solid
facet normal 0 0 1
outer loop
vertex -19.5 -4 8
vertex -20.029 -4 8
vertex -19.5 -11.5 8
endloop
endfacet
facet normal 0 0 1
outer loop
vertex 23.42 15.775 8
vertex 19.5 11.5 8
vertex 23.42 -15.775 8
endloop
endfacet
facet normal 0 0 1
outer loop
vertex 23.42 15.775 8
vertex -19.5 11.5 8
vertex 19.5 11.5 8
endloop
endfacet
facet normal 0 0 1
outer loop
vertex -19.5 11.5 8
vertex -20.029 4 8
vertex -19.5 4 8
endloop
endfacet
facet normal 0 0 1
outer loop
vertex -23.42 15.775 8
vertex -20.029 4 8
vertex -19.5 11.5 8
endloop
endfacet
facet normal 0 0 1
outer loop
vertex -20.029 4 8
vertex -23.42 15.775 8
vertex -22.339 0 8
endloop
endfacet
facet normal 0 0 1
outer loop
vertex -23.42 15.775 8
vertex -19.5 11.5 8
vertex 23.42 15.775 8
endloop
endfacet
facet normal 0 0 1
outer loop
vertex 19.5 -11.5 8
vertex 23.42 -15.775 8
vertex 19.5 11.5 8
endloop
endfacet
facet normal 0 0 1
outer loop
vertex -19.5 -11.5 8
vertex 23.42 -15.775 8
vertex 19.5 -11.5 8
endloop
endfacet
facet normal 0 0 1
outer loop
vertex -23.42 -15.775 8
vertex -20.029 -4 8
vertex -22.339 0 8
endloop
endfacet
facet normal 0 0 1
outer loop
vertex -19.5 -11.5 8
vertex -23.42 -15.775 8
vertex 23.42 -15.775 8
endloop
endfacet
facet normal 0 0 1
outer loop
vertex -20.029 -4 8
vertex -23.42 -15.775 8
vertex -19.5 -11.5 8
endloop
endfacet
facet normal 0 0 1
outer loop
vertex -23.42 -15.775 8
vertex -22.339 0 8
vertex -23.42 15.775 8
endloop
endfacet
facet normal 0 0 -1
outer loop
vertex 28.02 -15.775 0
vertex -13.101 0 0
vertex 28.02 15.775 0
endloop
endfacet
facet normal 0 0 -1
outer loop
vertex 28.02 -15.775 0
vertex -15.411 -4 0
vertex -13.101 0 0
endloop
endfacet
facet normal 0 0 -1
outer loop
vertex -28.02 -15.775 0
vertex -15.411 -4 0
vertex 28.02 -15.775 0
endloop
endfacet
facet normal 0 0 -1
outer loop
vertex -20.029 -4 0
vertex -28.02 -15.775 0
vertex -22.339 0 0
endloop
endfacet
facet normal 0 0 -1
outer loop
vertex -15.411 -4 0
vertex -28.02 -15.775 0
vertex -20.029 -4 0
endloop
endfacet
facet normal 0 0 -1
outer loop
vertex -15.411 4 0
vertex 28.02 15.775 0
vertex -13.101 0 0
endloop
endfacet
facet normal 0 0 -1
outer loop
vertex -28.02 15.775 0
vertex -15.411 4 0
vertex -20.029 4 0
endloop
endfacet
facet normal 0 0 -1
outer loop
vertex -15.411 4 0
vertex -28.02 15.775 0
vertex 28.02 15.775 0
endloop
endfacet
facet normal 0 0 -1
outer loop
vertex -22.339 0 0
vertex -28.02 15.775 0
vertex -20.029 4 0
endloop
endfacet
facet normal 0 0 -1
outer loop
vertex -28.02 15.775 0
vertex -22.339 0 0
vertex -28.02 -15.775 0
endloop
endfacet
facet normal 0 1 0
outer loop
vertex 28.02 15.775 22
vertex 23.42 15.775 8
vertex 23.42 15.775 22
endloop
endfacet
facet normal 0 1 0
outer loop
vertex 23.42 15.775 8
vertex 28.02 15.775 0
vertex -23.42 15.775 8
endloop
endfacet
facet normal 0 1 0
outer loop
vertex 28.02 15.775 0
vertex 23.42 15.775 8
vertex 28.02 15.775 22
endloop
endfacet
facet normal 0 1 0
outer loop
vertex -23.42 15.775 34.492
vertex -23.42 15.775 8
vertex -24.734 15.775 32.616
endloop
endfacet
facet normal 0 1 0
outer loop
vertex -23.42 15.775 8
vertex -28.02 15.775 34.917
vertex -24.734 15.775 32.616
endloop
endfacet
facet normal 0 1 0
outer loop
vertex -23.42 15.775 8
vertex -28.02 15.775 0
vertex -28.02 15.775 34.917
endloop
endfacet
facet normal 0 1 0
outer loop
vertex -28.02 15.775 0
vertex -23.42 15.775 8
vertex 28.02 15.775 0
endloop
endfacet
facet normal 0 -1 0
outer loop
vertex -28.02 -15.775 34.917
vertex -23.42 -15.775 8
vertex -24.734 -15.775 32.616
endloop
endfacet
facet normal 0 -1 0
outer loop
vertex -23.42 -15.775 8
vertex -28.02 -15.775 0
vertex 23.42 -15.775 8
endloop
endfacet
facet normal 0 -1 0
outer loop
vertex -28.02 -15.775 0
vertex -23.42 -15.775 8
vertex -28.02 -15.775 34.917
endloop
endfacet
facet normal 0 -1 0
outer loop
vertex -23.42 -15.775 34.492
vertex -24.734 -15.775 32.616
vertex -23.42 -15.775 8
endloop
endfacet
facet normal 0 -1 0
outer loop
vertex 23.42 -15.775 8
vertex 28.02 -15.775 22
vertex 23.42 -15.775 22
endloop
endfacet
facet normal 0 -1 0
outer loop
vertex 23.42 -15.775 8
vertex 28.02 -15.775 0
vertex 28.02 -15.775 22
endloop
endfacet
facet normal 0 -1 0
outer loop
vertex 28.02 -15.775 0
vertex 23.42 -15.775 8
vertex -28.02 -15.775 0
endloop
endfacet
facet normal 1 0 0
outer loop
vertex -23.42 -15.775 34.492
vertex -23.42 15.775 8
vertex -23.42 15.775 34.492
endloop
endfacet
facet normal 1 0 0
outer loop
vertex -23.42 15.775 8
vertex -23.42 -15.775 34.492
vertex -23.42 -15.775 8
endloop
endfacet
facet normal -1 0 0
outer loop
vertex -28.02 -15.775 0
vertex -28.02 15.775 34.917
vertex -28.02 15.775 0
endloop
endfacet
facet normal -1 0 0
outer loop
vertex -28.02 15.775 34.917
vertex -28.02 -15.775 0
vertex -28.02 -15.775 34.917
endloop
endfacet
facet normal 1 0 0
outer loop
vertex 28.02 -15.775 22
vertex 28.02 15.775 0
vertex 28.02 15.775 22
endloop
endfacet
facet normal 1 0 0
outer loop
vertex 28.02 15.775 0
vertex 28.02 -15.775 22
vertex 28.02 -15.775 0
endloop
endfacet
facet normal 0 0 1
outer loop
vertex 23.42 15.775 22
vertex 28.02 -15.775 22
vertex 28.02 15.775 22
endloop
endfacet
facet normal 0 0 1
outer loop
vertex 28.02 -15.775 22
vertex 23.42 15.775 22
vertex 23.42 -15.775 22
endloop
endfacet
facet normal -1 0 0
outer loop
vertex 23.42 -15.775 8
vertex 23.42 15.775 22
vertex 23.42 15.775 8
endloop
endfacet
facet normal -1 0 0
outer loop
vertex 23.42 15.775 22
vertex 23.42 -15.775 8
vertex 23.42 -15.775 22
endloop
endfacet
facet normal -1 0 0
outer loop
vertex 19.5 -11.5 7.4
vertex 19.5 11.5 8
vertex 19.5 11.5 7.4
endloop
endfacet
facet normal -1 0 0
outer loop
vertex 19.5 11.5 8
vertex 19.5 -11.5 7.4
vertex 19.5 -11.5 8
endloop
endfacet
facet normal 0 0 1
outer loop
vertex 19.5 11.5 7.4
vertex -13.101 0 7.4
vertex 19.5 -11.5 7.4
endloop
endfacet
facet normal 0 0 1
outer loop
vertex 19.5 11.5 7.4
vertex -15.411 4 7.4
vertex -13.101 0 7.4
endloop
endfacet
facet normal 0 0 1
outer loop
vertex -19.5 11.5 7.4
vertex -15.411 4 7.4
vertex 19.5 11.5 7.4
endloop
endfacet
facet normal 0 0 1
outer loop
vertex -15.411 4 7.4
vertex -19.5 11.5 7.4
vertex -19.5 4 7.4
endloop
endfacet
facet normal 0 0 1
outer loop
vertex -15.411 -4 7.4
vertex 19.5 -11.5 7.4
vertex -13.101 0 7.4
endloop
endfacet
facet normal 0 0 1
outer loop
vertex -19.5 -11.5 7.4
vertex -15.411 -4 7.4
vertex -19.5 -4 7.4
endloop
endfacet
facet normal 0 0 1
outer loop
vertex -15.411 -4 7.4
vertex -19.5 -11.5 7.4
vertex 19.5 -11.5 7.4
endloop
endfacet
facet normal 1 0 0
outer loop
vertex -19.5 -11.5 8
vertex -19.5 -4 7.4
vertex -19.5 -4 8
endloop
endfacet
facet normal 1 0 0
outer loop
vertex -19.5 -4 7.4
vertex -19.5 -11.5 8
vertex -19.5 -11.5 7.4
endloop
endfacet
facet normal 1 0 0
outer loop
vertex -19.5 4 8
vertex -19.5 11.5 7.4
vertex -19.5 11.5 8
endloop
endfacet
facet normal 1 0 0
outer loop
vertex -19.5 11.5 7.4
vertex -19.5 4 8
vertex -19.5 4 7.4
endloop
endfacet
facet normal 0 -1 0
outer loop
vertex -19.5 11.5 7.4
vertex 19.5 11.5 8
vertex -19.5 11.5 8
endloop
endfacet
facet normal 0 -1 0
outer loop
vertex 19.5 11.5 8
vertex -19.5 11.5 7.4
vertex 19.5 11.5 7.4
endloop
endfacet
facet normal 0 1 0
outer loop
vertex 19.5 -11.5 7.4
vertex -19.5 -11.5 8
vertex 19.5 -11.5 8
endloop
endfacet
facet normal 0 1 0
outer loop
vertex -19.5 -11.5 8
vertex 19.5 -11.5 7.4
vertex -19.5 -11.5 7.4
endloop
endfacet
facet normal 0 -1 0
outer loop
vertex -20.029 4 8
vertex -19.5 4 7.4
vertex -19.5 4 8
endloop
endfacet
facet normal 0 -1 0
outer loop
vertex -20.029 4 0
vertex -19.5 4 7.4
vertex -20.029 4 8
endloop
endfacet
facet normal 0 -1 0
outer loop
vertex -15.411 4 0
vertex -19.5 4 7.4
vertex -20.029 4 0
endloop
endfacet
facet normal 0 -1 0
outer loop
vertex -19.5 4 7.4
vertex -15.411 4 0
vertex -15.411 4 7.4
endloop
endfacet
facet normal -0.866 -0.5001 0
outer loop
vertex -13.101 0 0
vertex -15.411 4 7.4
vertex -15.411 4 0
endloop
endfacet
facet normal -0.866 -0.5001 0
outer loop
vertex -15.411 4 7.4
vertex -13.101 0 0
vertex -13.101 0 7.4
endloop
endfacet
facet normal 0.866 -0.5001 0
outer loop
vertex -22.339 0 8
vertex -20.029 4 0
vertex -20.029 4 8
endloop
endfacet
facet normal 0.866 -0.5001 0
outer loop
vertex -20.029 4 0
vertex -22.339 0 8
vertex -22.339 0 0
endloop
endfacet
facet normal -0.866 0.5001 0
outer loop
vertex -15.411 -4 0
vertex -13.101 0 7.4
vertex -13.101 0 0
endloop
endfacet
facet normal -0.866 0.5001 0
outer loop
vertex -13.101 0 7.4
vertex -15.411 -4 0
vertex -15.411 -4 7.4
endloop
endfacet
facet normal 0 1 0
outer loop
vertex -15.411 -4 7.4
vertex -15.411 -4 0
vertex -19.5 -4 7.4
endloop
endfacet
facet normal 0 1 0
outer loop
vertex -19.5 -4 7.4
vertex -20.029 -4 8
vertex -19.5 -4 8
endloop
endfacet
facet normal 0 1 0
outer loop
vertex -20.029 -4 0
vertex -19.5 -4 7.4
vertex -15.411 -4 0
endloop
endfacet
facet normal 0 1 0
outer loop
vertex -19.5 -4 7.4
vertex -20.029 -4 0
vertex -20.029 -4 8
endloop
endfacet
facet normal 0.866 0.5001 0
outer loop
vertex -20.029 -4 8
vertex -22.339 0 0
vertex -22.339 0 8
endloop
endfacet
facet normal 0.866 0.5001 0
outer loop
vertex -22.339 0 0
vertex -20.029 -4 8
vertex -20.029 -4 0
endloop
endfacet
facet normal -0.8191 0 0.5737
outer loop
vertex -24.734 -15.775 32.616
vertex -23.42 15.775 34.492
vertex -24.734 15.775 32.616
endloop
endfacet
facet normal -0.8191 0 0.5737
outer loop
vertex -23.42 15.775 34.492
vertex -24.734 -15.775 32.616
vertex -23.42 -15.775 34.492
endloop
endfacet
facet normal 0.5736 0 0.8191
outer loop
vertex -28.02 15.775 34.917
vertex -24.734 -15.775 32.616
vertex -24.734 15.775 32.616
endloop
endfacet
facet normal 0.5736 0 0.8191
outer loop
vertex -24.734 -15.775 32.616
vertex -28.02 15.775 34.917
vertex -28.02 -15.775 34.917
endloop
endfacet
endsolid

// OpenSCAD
// Rigid C-shaped / U-bracket with open rectangular throat and a CLEAR hex through-hole
// Bounding box target: 55.4 x 31.5 x 37.5 mm (L x W x H)

$fn = 96;

// -------------------- Parameters (mm) --------------------
bbox_L = 55.44;
bbox_W = 31.55;
bbox_H = 37.52;

wall_t        = 4.0;   // leg thickness along X
bar_thickness = 8.0;   // base bar thickness along Z

// Leg heights (asymmetric)
long_leg_H  = bbox_H;  // tall leg reaches full height
short_leg_H = 22.0;    // shorter leg

// Throat (open window) dimensions (void)
throat_L = 39.0;
throat_W = 23.0;

// Hex through-hole (through Z so hex is visible in TOP view)
hex_flat_to_flat         = 8.0;
hex_hole_offset_from_end = 10.0; // from left end along X
hex_hole_y_from_center   = 0.0;  // centered in width

// Place hole in the base bar so it is unmistakably present
hex_hole_z_from_bottom   = bar_thickness/2; // centered in bar thickness

// Chamfer/taper on outer end of tall leg (left end)
chamfer_len  = 3.0;   // along X
chamfer_drop = 1.5;   // along Z

// Robust boolean overlap
eps = 0.6;

// -------------------- Helpers --------------------
function hex_R_from_F(F) = F / sqrt(3); // circumradius for flat-to-flat F

module hex_prism_through_z(F, hZ) {
    // Hex centered at origin in XY, extruded along Z
    linear_extrude(height=hZ, center=true)
        polygon(points=[
            for (i=[0:5]) [
                hex_R_from_F(F) * cos(60*i),
                hex_R_from_F(F) * sin(60*i)
            ]
        ]);
}

// -------------------- Main solids --------------------
module long_bar() {
    // Base bar spans full length and width, thickness in Z, bottom at Z=0
    translate([0, 0, bar_thickness/2])
        cube([bbox_L, bbox_W, bar_thickness], center=true);
}

module leg_at_end(is_left=true, H=30) {
    // Vertical plate at an end, spanning full width in Y, thickness wall_t in X
    // Slight overlap into the bar for watertight union
    x = (is_left ? -bbox_L/2 + wall_t/2 : bbox_L/2 - wall_t/2);
    translate([x, 0, H/2])
        cube([wall_t + eps, bbox_W, H], center=true);
}

module u_bracket_solid() {
    union() {
        long_bar();
        leg_at_end(true,  long_leg_H);
        leg_at_end(false, short_leg_H);
    }
}

module throat_void() {
    // Remove a rectangular window above the bar, leaving end legs and open throat.
    // Keep a little clearance from the legs by using throat_L < (bbox_L - 2*wall_t).
    z_h = (bbox_H - bar_thickness) + 2*eps;
    translate([0, 0, bar_thickness + (bbox_H - bar_thickness)/2])
        cube([throat_L, throat_W, z_h], center=true);
}

module hex_hole() {
    // CLEAR hex through-hole through Z (visible in TOP view), located near left end.
    // Drill through the base bar thickness (plus eps) so it always cuts.
    x = -bbox_L/2 + hex_hole_offset_from_end;
    y = hex_hole_y_from_center;
    z = hex_hole_z_from_bottom;

    translate([x, y, z])
        hex_prism_through_z(hex_flat_to_flat, bar_thickness + 2*eps);
}

module long_leg_outer_chamfer() {
    // Chamfer at the OUTER top end of the tall (left) leg.
    // Cut a wedge near the leftmost face, sloping down toward +X.
    x_outer = -bbox_L/2;

    // Position cutter so it intersects the top of the long leg and the outer face.
    // Use generous size + eps to guarantee a clean cut.
    translate([x_outer + chamfer_len/2, 0, long_leg_H - chamfer_drop/2])
        rotate([0, 35, 0])
            cube([chamfer_len*2.4, bbox_W + 2*eps, chamfer_drop*3.4], center=true);
}

// -------------------- Final model --------------------
difference() {
    u_bracket_solid();
    throat_void();
    hex_hole();
    long_leg_outer_chamfer();
}
